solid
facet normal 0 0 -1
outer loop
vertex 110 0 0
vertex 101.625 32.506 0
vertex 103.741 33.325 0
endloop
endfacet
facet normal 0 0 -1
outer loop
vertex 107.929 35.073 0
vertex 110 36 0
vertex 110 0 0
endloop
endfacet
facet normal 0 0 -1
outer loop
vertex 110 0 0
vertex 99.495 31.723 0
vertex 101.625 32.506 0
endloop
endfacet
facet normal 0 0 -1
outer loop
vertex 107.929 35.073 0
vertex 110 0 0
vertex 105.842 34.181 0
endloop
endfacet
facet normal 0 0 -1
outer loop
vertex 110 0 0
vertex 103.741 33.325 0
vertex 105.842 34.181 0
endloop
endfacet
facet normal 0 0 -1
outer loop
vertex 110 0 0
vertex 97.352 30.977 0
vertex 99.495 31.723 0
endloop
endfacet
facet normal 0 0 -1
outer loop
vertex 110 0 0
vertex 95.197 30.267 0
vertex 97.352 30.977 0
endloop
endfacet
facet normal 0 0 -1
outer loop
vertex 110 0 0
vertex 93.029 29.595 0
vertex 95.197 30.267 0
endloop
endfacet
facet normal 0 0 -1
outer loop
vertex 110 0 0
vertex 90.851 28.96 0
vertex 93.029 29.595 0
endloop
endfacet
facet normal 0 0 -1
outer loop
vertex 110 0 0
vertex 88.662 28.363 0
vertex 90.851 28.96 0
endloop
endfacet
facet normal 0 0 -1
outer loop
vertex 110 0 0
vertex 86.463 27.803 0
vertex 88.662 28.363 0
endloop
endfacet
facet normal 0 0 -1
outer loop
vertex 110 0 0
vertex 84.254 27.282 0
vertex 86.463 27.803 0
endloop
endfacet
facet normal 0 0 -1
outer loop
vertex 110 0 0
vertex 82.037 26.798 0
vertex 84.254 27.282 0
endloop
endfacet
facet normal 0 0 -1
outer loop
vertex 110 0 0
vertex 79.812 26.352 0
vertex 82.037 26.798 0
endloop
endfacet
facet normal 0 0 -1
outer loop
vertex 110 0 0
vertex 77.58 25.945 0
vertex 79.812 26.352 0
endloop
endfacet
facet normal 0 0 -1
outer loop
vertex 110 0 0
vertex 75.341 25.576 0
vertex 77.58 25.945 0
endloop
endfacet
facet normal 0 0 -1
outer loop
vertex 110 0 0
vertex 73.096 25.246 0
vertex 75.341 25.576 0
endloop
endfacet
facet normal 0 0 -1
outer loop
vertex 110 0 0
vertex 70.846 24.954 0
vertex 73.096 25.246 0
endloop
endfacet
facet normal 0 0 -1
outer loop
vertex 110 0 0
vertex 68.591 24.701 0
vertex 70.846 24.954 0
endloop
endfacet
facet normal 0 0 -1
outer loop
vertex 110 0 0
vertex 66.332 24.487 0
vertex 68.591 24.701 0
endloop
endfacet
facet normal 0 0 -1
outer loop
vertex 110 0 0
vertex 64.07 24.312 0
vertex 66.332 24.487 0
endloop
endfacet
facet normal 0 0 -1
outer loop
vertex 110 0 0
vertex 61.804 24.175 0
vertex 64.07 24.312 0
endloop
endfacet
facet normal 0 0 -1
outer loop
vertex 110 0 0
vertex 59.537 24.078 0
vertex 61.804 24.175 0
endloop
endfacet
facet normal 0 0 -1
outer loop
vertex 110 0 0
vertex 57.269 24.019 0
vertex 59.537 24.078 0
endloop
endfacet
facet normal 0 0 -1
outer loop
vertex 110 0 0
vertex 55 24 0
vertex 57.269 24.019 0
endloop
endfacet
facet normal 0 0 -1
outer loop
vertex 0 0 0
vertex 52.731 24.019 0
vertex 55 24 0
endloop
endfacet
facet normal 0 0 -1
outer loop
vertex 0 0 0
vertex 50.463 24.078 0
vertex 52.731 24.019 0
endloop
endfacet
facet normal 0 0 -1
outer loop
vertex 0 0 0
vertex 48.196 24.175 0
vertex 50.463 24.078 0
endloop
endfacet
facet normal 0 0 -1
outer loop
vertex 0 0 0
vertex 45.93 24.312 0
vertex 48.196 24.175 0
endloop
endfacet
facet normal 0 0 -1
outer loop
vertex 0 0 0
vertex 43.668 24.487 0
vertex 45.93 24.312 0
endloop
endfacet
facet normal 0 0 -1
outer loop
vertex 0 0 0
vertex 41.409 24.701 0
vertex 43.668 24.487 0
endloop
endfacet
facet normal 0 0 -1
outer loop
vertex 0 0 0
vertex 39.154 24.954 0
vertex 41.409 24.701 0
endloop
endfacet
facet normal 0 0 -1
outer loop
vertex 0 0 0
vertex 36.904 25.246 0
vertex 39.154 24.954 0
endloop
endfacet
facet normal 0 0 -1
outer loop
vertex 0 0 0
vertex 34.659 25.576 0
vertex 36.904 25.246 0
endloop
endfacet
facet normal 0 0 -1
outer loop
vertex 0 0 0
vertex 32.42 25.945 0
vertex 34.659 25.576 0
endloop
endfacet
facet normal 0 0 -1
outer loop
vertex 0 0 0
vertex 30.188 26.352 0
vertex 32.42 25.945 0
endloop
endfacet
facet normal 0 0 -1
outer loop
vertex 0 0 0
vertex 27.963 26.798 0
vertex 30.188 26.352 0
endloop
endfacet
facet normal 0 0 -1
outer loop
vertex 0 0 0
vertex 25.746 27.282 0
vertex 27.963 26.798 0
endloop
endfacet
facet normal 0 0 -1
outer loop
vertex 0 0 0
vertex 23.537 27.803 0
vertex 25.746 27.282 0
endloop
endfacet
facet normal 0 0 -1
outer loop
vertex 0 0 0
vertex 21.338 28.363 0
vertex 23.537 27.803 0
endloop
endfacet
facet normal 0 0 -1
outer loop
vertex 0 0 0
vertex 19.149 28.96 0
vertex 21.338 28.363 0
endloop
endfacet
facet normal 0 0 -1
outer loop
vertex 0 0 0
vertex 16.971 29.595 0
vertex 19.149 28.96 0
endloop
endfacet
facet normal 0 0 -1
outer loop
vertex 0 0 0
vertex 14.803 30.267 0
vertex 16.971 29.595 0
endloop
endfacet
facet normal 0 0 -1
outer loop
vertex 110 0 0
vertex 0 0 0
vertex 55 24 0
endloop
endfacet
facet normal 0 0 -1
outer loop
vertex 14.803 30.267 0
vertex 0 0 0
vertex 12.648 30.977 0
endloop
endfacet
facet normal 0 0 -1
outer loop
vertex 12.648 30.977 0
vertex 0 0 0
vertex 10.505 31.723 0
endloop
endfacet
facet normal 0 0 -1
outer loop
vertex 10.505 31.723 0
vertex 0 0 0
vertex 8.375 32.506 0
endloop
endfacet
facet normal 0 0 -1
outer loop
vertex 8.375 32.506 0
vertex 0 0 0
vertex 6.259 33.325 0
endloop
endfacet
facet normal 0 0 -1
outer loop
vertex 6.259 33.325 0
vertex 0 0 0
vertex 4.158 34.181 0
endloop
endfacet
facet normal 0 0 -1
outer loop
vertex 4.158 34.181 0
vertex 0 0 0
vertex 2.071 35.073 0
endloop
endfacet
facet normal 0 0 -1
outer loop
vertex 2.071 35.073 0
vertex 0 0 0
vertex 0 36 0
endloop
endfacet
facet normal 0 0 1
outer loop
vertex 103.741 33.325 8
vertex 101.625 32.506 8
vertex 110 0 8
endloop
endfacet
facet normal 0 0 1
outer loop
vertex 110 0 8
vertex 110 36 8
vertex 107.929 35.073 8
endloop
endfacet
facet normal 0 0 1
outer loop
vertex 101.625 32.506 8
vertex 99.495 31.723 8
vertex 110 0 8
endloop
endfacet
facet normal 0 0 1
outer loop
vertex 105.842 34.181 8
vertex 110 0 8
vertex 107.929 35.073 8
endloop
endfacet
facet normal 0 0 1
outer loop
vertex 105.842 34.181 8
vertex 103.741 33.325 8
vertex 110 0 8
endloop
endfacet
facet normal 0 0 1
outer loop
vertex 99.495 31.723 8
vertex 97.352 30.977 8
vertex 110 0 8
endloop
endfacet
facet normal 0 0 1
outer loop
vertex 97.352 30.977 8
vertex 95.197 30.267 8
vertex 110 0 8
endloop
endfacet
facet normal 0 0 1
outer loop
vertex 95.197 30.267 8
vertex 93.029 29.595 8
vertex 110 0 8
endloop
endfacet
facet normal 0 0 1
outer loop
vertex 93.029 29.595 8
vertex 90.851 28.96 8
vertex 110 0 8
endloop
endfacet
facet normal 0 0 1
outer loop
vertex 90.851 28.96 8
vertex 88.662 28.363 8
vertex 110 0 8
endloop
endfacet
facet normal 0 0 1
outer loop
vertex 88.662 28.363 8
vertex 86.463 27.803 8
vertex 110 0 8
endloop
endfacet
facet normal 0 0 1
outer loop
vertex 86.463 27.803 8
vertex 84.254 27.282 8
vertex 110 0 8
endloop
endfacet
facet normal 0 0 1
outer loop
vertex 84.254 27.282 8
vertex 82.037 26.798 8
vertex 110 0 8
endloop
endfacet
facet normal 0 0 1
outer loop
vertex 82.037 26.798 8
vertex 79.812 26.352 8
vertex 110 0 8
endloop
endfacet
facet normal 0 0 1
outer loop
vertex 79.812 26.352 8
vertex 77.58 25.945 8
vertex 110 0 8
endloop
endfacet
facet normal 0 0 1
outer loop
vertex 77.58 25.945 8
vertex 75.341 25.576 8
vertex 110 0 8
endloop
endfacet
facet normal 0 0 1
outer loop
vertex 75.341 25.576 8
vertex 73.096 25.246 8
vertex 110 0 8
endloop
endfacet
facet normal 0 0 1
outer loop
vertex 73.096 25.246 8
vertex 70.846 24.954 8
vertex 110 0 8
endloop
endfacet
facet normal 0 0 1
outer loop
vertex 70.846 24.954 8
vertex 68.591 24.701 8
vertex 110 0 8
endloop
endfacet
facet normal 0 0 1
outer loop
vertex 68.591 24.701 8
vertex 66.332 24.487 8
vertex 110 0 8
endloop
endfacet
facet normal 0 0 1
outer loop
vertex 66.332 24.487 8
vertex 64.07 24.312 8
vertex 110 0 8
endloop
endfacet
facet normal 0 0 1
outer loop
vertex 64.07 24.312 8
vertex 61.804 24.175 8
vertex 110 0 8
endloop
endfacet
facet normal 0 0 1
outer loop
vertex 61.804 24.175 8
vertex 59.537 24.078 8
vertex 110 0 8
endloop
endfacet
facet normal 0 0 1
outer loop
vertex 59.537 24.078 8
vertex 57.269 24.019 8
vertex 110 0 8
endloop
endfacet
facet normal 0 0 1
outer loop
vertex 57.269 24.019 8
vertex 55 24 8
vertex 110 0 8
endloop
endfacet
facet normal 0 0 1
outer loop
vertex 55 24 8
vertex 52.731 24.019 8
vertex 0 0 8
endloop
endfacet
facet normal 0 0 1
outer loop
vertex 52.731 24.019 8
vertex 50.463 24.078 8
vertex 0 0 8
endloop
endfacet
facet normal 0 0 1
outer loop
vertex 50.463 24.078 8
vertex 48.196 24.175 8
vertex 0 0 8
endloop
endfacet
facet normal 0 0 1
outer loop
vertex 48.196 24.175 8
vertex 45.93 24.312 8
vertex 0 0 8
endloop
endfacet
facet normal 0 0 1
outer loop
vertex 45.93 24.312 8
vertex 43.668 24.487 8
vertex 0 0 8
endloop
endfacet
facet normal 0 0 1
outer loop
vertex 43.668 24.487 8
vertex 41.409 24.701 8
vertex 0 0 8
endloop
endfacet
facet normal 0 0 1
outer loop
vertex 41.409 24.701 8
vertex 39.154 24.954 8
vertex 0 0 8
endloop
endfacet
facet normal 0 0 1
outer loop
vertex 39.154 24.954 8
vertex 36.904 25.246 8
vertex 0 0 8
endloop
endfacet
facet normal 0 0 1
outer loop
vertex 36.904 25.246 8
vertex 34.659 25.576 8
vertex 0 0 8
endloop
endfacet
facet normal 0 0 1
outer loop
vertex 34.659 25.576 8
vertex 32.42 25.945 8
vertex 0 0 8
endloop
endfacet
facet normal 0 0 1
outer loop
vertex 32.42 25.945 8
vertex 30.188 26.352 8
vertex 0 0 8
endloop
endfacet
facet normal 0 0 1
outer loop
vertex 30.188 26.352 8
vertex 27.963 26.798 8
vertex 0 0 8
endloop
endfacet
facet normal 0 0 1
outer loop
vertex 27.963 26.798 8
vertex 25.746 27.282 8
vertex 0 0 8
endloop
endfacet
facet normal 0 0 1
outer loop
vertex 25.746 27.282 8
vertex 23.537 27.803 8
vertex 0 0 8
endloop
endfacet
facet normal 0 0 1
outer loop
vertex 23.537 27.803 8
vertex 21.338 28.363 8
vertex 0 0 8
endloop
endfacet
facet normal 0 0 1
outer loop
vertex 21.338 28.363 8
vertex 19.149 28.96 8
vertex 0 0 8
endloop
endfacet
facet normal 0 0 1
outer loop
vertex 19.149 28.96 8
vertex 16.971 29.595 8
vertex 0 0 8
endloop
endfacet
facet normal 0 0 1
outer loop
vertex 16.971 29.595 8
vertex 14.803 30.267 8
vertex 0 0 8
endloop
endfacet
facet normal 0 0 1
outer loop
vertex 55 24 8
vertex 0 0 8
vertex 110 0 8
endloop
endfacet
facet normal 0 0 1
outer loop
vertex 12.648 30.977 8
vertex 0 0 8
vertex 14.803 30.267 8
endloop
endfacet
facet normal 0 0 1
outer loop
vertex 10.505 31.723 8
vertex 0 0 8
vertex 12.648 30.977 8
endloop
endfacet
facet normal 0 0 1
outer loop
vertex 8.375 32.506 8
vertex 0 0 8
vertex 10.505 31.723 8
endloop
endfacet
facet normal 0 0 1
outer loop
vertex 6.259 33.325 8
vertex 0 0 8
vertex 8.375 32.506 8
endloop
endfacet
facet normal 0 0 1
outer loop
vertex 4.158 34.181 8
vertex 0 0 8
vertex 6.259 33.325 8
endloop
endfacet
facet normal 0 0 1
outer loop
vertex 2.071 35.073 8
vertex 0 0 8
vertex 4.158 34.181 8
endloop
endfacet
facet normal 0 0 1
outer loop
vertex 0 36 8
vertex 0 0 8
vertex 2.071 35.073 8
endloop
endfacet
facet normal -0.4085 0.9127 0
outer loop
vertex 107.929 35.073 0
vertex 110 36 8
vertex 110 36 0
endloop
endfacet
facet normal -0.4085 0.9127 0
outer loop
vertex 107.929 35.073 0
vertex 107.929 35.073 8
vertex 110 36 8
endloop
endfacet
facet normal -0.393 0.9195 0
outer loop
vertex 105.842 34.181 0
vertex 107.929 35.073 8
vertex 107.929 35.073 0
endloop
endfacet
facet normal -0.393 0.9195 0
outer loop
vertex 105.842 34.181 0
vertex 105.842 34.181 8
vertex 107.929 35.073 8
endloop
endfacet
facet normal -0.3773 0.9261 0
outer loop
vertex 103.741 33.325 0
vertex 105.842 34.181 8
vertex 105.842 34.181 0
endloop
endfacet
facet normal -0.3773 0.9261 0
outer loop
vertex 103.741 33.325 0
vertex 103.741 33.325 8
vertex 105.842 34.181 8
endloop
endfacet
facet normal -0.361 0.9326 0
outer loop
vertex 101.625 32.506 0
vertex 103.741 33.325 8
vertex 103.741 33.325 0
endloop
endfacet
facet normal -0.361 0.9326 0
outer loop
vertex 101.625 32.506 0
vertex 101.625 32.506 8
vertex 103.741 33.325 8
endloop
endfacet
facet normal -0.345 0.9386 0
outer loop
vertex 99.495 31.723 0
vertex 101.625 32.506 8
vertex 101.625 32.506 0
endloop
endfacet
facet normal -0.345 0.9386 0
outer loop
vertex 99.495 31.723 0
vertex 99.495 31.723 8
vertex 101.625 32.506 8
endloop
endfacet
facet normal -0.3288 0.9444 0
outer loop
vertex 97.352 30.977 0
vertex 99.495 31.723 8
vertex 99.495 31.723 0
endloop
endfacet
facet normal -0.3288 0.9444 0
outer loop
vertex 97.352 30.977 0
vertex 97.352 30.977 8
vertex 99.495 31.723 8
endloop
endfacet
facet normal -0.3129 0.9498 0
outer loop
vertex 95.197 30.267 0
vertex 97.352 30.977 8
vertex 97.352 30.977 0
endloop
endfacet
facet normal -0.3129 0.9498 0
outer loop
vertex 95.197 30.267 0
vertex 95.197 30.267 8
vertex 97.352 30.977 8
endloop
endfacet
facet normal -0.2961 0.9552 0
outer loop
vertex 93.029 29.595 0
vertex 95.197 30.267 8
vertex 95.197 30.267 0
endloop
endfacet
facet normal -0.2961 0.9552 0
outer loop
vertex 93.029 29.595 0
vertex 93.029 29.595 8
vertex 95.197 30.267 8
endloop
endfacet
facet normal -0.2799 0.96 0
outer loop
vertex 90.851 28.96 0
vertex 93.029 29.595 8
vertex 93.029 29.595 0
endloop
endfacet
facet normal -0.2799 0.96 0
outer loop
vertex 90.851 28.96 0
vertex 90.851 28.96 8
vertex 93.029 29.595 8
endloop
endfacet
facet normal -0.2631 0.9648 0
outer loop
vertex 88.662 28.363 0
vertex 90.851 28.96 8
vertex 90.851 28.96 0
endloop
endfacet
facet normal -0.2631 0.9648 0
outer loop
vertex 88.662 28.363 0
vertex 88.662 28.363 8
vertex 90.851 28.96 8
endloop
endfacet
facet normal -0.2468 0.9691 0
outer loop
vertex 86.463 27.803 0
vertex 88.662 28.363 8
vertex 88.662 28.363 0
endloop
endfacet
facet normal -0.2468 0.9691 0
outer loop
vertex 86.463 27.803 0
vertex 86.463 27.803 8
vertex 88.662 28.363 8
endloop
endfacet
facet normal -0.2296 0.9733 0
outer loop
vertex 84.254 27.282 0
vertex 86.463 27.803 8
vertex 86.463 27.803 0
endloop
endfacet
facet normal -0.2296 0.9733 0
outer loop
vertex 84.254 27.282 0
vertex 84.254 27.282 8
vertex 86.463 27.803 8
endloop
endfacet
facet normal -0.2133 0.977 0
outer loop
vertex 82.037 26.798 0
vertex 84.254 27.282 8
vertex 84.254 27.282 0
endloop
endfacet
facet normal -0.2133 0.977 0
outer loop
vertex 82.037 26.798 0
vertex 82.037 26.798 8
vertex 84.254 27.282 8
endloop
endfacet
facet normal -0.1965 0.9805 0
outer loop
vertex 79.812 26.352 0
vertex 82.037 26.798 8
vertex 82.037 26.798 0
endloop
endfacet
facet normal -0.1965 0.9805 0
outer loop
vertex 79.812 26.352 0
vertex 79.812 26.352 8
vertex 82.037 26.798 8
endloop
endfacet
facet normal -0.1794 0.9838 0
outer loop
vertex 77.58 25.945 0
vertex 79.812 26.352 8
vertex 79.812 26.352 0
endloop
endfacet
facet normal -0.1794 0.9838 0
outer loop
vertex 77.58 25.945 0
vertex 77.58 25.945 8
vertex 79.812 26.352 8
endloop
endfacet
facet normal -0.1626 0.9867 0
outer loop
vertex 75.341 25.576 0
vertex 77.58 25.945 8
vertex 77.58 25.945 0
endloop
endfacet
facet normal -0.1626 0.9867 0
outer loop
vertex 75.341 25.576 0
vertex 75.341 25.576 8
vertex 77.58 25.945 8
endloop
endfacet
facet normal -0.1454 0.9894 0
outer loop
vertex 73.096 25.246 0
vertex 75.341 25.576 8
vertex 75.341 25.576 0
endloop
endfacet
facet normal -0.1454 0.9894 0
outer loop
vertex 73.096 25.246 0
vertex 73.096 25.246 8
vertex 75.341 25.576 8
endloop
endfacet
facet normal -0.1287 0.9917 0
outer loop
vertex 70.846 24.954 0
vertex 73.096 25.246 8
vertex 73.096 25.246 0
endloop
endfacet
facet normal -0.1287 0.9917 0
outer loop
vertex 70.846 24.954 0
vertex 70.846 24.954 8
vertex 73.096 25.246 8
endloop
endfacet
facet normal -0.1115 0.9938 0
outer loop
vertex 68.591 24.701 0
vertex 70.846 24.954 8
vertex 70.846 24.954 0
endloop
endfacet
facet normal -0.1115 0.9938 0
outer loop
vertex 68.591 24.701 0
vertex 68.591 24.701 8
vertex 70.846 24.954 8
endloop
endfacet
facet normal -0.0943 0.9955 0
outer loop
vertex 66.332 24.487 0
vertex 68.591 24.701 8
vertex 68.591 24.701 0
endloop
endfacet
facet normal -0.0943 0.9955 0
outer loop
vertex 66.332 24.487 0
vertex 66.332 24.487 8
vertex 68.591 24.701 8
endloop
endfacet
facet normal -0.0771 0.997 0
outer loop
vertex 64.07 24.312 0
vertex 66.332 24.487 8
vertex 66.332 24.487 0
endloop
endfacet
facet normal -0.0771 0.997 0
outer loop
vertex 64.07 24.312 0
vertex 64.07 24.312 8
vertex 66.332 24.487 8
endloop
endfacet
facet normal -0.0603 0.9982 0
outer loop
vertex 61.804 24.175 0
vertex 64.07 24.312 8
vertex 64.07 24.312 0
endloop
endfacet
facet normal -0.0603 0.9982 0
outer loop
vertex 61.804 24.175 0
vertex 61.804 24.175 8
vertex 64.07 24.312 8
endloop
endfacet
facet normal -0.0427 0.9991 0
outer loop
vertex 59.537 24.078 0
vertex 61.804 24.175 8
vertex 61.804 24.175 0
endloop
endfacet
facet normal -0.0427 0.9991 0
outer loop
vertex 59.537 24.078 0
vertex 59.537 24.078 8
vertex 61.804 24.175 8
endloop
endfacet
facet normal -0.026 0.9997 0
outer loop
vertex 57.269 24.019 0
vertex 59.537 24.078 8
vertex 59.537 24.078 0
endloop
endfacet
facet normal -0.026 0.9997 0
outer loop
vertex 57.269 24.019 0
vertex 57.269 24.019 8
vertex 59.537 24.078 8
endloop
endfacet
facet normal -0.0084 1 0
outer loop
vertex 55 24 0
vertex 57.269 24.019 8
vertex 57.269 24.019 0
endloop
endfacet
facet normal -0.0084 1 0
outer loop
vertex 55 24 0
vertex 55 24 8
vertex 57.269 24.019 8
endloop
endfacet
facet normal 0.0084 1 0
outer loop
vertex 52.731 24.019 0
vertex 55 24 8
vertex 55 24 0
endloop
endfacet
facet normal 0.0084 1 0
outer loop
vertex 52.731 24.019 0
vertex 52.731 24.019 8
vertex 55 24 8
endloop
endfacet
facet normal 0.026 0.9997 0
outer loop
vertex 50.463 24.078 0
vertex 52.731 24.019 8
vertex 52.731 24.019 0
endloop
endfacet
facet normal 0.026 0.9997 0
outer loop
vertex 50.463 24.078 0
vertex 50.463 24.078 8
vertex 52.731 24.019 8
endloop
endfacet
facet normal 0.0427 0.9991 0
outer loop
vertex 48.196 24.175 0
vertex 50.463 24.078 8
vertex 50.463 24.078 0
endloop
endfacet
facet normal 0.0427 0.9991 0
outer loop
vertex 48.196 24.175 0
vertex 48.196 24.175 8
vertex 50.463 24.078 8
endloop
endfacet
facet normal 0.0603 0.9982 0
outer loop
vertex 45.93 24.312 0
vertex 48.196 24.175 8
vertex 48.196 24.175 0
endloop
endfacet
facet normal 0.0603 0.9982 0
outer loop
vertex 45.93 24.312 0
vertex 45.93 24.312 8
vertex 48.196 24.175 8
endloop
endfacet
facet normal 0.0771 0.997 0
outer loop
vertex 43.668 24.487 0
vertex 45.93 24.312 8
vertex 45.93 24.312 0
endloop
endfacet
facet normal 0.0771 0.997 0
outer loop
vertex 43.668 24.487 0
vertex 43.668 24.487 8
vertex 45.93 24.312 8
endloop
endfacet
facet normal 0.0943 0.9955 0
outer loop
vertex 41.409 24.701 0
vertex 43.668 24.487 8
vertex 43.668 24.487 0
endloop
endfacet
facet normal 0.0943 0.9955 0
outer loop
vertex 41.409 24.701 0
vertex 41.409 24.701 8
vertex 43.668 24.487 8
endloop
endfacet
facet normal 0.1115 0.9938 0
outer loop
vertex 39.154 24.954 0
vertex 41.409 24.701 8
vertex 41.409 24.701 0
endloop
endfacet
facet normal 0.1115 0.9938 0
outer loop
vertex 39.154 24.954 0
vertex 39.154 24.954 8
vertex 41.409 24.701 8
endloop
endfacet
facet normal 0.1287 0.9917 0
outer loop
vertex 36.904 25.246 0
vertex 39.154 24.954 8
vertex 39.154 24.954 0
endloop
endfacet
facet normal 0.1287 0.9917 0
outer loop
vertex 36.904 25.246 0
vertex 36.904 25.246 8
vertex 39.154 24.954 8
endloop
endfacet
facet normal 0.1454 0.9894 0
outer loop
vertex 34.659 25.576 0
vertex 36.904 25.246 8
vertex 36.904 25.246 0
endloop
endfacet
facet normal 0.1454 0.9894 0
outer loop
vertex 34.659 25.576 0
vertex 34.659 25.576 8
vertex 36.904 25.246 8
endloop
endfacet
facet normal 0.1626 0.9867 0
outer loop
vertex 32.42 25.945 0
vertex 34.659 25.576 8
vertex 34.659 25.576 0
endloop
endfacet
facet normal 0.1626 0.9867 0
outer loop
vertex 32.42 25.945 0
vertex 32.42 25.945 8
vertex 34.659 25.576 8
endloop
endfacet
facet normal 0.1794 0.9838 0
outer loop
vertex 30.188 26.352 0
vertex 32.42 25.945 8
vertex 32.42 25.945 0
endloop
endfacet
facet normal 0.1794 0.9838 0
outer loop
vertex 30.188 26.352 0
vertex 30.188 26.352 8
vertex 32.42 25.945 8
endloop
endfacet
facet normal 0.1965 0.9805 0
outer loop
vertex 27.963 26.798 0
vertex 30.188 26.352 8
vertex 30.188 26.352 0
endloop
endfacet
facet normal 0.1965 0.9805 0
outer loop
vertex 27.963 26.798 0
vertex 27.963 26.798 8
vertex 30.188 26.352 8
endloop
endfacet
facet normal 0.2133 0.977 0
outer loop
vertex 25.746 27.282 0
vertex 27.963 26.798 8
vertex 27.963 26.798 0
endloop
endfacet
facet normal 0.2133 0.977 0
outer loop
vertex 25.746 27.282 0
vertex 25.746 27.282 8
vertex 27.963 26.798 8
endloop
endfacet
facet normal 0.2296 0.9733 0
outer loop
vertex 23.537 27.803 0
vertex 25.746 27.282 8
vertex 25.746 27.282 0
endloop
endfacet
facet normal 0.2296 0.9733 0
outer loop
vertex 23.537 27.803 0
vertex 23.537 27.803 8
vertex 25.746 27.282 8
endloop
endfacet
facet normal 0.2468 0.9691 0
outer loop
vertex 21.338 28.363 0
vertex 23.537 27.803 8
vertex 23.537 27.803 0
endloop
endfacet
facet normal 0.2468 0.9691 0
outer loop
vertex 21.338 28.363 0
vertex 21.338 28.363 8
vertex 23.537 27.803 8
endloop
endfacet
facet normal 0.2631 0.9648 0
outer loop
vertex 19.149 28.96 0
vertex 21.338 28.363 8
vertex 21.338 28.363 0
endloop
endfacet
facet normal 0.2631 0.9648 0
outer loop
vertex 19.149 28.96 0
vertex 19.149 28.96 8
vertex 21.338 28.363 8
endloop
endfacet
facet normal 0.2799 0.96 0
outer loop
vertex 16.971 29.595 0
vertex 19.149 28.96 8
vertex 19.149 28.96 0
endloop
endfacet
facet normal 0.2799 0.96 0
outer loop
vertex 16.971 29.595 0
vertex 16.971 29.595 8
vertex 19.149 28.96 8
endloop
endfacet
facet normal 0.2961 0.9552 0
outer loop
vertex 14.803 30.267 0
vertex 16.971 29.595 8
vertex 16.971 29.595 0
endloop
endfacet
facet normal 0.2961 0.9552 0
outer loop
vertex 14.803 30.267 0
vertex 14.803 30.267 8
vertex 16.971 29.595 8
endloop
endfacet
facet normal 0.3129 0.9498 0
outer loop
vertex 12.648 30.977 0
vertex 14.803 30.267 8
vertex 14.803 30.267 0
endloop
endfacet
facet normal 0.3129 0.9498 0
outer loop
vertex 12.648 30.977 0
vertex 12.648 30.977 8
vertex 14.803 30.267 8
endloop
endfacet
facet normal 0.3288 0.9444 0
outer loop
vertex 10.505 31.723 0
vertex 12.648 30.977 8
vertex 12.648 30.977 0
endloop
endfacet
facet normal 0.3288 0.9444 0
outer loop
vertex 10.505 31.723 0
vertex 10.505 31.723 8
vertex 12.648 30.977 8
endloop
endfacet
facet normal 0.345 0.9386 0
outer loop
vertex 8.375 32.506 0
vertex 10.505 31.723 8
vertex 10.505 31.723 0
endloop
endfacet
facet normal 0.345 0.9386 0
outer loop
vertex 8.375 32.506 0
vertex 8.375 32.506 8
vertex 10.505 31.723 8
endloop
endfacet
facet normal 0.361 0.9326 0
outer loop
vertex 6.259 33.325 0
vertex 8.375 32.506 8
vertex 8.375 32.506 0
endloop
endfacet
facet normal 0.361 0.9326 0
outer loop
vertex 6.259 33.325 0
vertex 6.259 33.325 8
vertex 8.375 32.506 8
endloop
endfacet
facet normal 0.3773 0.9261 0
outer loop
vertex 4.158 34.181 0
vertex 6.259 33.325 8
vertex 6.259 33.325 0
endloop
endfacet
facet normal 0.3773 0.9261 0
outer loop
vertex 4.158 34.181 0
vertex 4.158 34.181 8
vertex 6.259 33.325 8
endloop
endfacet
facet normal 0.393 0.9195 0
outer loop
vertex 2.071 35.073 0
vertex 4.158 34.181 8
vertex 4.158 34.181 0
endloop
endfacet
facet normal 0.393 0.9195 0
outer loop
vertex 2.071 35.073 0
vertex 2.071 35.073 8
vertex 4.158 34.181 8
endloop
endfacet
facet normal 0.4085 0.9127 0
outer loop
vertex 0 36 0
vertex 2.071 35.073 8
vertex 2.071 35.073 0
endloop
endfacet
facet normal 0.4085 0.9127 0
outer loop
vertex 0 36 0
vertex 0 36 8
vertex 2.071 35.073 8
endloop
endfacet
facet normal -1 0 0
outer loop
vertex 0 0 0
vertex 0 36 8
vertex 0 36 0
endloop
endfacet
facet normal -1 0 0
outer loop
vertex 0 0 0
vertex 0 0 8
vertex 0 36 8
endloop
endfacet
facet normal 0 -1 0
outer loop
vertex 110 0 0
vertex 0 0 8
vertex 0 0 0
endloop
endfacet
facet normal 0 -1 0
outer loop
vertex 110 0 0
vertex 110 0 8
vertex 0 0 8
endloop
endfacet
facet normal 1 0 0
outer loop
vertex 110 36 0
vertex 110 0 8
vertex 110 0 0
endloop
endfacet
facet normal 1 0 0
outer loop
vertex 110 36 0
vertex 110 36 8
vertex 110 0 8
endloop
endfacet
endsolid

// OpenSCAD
$fn = 32;

// ----------------------------------------------------------------------
// Arc profile plate: notch, 53 points
// ----------------------------------------------------------------------

// --- parameters (mm) ---
bar_l = 110;              // bar length, X
bar_w = 36;               // bar width, Y
notch_depth = 12;         // depth of the arc notch at mid-span
arc_r = 132.04;           // radius of the notch arc
arc_angle = 49.23;        // notch arc angle, degrees
arc_step = 1;             // sampling step of the notch arc, degrees
plate_t = 8;              // plate thickness, Z
fit_tol = 0.1;            // declared fit tolerance (prompt contract)
free_tol = 0.3;           // declared free tolerance (prompt contract)

profile = [[0, 0], [110, 0], [110, 36], [107.929, 35.073], [105.842, 34.181], [103.741, 33.325], [101.625, 32.506], [99.495, 31.723], [97.352, 30.977], [95.197, 30.267], [93.029, 29.595], [90.851, 28.96], [88.662, 28.363], [86.463, 27.803], [84.254, 27.282], [82.037, 26.798], [79.812, 26.352], [77.58, 25.945], [75.341, 25.576], [73.096, 25.246], [70.846, 24.954], [68.591, 24.701], [66.332, 24.487], [64.07, 24.312], [61.804, 24.175], [59.537, 24.078], [57.269, 24.019], [55, 24], [52.731, 24.019], [50.463, 24.078], [48.196, 24.175], [45.93, 24.312], [43.668, 24.487], [41.409, 24.701], [39.154, 24.954], [36.904, 25.246], [34.659, 25.576], [32.42, 25.945], [30.188, 26.352], [27.963, 26.798], [25.746, 27.282], [23.537, 27.803], [21.338, 28.363], [19.149, 28.96], [16.971, 29.595], [14.803, 30.267], [12.648, 30.977], [10.505, 31.723], [8.375, 32.506], [6.259, 33.325], [4.158, 34.181], [2.071, 35.073], [0, 36]];  // primary outline, 53 points, counter clockwise

// --- the one profile operation ---
linear_extrude(height = plate_t) polygon(points = profile);
